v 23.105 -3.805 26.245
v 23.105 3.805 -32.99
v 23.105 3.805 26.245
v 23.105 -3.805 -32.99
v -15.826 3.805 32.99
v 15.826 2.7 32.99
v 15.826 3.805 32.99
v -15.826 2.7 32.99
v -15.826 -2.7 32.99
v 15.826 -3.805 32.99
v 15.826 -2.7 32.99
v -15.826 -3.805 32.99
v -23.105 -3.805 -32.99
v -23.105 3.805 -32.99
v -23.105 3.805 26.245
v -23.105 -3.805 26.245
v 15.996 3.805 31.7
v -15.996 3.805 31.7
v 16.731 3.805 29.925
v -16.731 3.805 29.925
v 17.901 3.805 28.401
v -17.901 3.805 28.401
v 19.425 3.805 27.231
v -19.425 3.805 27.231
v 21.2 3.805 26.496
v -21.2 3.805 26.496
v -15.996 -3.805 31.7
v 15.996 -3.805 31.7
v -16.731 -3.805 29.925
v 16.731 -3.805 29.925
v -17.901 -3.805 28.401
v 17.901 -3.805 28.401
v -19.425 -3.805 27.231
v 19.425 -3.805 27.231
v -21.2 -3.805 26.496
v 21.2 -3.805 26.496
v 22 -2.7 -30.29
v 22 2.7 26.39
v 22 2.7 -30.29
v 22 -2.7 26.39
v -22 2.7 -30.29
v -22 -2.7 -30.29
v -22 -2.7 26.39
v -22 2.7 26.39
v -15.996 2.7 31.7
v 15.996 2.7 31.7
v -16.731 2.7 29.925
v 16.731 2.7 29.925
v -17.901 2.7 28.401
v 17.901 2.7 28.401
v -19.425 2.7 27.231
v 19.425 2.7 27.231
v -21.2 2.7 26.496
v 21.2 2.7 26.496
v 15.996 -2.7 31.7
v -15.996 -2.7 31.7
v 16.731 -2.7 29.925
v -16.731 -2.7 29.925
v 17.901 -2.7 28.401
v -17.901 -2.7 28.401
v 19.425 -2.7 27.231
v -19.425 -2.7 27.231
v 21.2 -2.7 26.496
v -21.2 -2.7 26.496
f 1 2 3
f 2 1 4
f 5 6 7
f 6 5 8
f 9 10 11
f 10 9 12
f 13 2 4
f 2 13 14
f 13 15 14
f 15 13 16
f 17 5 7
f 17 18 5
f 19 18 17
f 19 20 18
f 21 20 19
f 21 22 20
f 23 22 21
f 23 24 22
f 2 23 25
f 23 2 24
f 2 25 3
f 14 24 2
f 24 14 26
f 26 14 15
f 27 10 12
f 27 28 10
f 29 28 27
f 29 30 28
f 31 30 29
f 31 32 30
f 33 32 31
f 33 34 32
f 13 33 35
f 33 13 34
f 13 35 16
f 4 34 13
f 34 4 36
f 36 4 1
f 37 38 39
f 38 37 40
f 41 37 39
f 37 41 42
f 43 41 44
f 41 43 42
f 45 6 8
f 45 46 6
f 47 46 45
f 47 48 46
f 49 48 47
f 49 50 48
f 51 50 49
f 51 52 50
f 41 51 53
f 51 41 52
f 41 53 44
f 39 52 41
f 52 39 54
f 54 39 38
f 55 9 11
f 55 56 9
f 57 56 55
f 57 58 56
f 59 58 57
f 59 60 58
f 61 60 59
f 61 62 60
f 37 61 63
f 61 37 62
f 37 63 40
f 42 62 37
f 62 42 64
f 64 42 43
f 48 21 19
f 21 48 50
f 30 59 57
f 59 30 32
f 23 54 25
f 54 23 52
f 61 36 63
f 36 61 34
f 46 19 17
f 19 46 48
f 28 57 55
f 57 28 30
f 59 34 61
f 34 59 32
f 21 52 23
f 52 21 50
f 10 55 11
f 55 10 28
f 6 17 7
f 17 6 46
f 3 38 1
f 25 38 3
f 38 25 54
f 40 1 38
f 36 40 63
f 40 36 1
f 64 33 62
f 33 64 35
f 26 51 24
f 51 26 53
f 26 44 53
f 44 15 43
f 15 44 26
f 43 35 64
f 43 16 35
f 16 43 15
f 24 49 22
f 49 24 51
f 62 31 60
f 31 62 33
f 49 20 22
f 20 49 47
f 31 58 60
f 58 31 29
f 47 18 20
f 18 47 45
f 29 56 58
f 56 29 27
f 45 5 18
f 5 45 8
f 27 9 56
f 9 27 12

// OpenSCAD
// [FL_INDEX: keywords="openscad, 3d_parametric, Parametric_Cell_Phone_Battery_holder, csg_solid" | COT="Parametric OpenSCAD design from 3DCodeverse"]
// Title: Parametric Cell Phone Battery holder.  

/*
Parametric Cell Phone Battery holder. 

Case to hold a spare battery without fear of shorting it out.

Created by Mike Creuzer - Mike@Creuzer.com - 20120816
*/

// Battery dimensions in mm
// Internal height
height = 65;
// Internal Width
width  = 44;
// Internal narrow bit
depth  = 5.4;

// Print Settings in mm
// Looking at the gcode of a sliced file often times tells you this at the top of the file
singleWallWidth = .49; 
// Number of walls you want
thickness          = 2; 
// how much added 'slop' you want so the case is easier to use.
clearence          = .25; 




difference()
{
	cube(size = [width + 2*thickness*singleWallWidth + clearence, depth + 2*thickness*singleWallWidth + clearence, height + thickness*singleWallWidth], center=true);

	translate([0,0,2*thickness*singleWallWidth + clearence]) cube(size = [width,depth, height], center=true);
	translate([.5*(width + 2*thickness*singleWallWidth + clearence),0,.5 * (height + 2*thickness*singleWallWidth + clearence)]) rotate([90,0,0]) cylinder(r = depth + 2*thickness*singleWallWidth, h=depth + 2*thickness*singleWallWidth + clearence, center=true);
	translate([-.5*(width + 2*thickness*singleWallWidth + clearence),0,.5 * (height + 2*thickness*singleWallWidth + clearence)]) rotate([90,0,0]) cylinder(r = depth + 2*thickness*singleWallWidth, h=depth + 2*thickness*singleWallWidth + clearence, center=true);

}
